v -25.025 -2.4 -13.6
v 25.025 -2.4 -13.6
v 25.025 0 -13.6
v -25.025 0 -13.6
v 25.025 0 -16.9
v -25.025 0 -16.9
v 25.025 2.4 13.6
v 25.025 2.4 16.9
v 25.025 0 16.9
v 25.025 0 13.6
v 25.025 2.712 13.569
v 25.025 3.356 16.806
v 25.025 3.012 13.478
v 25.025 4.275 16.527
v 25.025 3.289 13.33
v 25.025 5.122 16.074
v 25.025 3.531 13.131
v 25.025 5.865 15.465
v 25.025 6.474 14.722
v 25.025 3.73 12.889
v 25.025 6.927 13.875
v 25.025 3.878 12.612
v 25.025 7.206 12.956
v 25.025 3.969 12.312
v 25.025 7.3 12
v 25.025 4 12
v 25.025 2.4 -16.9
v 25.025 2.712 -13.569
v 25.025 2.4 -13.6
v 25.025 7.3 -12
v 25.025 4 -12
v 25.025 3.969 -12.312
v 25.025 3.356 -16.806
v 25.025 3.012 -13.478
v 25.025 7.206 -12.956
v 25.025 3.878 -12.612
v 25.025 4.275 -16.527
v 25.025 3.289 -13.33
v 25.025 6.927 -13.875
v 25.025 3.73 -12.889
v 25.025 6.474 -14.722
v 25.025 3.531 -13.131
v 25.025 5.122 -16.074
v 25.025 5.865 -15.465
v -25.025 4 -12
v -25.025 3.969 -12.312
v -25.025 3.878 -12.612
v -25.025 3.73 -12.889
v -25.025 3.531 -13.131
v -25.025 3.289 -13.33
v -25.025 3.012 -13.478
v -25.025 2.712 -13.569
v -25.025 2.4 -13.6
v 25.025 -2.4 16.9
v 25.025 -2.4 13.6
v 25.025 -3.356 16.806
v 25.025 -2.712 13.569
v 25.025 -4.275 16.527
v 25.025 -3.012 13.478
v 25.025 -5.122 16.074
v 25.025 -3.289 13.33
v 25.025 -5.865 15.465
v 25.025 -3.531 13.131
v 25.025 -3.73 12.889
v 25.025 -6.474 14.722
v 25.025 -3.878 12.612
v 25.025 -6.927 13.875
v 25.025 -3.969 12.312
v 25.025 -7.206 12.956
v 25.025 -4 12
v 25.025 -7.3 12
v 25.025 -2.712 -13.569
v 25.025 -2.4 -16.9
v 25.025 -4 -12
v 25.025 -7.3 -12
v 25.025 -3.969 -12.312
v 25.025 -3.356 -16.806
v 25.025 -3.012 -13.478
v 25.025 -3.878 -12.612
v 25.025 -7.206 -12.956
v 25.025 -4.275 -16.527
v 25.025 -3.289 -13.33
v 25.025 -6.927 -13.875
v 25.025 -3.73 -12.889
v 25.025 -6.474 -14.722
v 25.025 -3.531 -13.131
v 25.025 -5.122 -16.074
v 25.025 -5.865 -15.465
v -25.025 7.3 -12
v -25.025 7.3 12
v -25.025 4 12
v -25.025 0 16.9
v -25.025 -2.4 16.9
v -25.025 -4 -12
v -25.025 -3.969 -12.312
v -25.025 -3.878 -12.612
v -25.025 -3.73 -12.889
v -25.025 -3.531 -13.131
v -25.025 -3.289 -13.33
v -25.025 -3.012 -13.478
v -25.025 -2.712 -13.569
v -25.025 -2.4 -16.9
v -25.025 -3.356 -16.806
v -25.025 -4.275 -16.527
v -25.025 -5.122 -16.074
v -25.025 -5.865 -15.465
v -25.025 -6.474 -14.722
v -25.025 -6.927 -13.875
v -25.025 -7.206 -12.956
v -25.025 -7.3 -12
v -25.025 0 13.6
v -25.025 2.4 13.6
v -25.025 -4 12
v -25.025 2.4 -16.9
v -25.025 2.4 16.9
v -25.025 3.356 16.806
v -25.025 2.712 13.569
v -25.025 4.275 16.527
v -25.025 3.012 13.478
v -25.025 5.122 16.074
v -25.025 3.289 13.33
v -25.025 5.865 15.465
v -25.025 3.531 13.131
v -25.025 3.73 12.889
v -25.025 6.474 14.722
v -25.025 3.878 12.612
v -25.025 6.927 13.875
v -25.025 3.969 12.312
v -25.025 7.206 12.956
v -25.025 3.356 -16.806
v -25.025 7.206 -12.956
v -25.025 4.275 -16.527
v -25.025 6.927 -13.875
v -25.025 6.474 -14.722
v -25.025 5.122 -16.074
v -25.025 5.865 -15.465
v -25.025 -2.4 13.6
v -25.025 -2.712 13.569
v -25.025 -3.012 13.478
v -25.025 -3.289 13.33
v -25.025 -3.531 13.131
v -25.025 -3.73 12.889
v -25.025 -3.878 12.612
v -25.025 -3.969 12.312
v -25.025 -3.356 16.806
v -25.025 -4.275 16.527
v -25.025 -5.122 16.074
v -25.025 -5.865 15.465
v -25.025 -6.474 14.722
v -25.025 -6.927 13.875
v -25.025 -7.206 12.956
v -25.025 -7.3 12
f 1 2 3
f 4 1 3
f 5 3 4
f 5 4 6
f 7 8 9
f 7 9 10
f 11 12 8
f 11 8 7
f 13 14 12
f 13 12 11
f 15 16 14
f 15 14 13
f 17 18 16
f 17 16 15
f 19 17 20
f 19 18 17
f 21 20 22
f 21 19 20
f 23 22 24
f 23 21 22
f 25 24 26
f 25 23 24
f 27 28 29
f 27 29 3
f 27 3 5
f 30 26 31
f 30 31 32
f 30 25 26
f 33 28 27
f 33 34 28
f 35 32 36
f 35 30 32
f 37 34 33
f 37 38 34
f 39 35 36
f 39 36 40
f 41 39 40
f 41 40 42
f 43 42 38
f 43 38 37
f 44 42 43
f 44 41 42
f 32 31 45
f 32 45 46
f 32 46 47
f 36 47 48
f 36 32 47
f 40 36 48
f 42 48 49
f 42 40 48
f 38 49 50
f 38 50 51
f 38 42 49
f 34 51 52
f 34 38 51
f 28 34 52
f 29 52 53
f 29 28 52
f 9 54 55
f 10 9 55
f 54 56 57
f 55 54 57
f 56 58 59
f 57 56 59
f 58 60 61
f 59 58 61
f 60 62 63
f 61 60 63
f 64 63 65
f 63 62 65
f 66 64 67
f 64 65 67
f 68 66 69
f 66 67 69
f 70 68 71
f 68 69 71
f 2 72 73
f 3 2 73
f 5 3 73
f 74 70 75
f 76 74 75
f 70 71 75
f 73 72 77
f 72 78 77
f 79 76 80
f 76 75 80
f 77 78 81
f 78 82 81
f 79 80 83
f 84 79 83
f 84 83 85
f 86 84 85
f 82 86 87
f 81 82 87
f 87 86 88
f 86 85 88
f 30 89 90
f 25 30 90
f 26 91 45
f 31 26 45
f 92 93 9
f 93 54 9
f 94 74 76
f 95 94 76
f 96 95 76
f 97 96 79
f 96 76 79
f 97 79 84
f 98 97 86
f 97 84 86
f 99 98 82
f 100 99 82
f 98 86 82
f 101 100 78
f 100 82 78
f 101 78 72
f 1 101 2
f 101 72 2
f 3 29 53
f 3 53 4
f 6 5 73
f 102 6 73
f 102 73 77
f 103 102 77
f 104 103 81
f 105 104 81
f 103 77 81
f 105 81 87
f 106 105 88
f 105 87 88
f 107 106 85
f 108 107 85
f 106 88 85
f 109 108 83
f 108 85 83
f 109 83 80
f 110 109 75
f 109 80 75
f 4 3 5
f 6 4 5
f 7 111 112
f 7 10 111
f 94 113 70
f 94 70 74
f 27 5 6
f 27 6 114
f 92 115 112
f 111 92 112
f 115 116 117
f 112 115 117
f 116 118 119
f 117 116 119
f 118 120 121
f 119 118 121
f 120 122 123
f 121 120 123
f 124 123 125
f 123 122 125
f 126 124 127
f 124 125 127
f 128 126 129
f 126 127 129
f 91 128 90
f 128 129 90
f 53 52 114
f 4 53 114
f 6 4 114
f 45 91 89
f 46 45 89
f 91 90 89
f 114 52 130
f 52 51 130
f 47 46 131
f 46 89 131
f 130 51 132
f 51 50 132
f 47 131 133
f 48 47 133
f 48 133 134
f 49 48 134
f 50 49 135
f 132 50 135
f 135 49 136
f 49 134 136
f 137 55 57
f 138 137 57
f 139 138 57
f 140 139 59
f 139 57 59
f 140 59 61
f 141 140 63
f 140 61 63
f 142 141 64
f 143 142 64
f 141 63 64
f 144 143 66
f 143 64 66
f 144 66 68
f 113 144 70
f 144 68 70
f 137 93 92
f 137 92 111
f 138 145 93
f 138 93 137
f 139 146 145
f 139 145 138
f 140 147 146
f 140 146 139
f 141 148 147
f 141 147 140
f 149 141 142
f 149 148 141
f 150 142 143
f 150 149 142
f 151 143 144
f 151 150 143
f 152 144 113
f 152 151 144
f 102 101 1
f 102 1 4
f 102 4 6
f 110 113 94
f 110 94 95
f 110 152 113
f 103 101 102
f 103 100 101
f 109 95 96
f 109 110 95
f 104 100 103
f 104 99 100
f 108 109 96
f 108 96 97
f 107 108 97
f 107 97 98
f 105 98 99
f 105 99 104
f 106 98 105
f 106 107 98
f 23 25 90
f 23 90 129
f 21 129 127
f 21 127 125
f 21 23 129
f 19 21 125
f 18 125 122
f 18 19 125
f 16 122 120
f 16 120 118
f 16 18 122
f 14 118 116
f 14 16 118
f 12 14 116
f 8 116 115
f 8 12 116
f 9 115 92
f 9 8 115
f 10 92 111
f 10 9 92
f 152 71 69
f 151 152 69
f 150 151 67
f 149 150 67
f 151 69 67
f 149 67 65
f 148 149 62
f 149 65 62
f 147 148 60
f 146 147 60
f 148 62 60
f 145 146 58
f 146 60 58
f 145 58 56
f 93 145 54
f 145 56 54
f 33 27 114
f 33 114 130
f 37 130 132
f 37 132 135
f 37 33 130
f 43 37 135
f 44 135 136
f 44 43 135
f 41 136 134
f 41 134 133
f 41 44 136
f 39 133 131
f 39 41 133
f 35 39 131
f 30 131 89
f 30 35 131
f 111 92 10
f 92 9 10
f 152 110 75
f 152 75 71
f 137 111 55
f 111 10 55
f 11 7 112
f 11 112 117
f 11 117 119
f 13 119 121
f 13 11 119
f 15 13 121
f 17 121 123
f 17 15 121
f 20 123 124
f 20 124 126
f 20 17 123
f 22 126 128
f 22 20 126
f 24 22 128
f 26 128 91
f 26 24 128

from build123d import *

# Parameters (mm, degrees)
BOSS_EXTRUDE1_DEPTH = 25.025


with BuildPart() as part:
    # Sketch1 → Boss-Extrude1 (new, symmetric)
    with BuildSketch(Plane(origin=(0, 0, 0), x_dir=(0, 0, -1), z_dir=(1, 0, 0))):
        with BuildLine():
            Line((-13.6, 0), (-13.6, 2.4))
            ThreePointArc((-13.6, 2.4), (-13.13137085, 3.53137085), (-12, 4))
            Line((-12, 4), (12, 4))
            ThreePointArc((12, 4), (13.13137085, 3.53137085), (13.6, 2.4))
            Line((13.6, 2.4), (13.6, 0))
            Line((13.6, 0), (16.9, 0))
            Line((16.9, 0), (16.9, 2.4))
            ThreePointArc((16.9, 2.4), (15.464823228, 5.864823228), (12, 7.3))
            Line((12, 7.3), (-12, 7.3))
            ThreePointArc((-12, 7.3), (-15.464823228, 5.864823228), (-16.9, 2.4))
            Line((-16.9, 2.4), (-16.9, 0))
            Line((-16.9, 0), (-13.6, 0))
        make_face()
    extrude(amount=BOSS_EXTRUDE1_DEPTH, both=True)


with BuildPart() as body_2:
    # Mirror1: mirrored copy
    add(part.part.mirror(Plane.ZX))


solid = Compound([part.part, body_2.part])
